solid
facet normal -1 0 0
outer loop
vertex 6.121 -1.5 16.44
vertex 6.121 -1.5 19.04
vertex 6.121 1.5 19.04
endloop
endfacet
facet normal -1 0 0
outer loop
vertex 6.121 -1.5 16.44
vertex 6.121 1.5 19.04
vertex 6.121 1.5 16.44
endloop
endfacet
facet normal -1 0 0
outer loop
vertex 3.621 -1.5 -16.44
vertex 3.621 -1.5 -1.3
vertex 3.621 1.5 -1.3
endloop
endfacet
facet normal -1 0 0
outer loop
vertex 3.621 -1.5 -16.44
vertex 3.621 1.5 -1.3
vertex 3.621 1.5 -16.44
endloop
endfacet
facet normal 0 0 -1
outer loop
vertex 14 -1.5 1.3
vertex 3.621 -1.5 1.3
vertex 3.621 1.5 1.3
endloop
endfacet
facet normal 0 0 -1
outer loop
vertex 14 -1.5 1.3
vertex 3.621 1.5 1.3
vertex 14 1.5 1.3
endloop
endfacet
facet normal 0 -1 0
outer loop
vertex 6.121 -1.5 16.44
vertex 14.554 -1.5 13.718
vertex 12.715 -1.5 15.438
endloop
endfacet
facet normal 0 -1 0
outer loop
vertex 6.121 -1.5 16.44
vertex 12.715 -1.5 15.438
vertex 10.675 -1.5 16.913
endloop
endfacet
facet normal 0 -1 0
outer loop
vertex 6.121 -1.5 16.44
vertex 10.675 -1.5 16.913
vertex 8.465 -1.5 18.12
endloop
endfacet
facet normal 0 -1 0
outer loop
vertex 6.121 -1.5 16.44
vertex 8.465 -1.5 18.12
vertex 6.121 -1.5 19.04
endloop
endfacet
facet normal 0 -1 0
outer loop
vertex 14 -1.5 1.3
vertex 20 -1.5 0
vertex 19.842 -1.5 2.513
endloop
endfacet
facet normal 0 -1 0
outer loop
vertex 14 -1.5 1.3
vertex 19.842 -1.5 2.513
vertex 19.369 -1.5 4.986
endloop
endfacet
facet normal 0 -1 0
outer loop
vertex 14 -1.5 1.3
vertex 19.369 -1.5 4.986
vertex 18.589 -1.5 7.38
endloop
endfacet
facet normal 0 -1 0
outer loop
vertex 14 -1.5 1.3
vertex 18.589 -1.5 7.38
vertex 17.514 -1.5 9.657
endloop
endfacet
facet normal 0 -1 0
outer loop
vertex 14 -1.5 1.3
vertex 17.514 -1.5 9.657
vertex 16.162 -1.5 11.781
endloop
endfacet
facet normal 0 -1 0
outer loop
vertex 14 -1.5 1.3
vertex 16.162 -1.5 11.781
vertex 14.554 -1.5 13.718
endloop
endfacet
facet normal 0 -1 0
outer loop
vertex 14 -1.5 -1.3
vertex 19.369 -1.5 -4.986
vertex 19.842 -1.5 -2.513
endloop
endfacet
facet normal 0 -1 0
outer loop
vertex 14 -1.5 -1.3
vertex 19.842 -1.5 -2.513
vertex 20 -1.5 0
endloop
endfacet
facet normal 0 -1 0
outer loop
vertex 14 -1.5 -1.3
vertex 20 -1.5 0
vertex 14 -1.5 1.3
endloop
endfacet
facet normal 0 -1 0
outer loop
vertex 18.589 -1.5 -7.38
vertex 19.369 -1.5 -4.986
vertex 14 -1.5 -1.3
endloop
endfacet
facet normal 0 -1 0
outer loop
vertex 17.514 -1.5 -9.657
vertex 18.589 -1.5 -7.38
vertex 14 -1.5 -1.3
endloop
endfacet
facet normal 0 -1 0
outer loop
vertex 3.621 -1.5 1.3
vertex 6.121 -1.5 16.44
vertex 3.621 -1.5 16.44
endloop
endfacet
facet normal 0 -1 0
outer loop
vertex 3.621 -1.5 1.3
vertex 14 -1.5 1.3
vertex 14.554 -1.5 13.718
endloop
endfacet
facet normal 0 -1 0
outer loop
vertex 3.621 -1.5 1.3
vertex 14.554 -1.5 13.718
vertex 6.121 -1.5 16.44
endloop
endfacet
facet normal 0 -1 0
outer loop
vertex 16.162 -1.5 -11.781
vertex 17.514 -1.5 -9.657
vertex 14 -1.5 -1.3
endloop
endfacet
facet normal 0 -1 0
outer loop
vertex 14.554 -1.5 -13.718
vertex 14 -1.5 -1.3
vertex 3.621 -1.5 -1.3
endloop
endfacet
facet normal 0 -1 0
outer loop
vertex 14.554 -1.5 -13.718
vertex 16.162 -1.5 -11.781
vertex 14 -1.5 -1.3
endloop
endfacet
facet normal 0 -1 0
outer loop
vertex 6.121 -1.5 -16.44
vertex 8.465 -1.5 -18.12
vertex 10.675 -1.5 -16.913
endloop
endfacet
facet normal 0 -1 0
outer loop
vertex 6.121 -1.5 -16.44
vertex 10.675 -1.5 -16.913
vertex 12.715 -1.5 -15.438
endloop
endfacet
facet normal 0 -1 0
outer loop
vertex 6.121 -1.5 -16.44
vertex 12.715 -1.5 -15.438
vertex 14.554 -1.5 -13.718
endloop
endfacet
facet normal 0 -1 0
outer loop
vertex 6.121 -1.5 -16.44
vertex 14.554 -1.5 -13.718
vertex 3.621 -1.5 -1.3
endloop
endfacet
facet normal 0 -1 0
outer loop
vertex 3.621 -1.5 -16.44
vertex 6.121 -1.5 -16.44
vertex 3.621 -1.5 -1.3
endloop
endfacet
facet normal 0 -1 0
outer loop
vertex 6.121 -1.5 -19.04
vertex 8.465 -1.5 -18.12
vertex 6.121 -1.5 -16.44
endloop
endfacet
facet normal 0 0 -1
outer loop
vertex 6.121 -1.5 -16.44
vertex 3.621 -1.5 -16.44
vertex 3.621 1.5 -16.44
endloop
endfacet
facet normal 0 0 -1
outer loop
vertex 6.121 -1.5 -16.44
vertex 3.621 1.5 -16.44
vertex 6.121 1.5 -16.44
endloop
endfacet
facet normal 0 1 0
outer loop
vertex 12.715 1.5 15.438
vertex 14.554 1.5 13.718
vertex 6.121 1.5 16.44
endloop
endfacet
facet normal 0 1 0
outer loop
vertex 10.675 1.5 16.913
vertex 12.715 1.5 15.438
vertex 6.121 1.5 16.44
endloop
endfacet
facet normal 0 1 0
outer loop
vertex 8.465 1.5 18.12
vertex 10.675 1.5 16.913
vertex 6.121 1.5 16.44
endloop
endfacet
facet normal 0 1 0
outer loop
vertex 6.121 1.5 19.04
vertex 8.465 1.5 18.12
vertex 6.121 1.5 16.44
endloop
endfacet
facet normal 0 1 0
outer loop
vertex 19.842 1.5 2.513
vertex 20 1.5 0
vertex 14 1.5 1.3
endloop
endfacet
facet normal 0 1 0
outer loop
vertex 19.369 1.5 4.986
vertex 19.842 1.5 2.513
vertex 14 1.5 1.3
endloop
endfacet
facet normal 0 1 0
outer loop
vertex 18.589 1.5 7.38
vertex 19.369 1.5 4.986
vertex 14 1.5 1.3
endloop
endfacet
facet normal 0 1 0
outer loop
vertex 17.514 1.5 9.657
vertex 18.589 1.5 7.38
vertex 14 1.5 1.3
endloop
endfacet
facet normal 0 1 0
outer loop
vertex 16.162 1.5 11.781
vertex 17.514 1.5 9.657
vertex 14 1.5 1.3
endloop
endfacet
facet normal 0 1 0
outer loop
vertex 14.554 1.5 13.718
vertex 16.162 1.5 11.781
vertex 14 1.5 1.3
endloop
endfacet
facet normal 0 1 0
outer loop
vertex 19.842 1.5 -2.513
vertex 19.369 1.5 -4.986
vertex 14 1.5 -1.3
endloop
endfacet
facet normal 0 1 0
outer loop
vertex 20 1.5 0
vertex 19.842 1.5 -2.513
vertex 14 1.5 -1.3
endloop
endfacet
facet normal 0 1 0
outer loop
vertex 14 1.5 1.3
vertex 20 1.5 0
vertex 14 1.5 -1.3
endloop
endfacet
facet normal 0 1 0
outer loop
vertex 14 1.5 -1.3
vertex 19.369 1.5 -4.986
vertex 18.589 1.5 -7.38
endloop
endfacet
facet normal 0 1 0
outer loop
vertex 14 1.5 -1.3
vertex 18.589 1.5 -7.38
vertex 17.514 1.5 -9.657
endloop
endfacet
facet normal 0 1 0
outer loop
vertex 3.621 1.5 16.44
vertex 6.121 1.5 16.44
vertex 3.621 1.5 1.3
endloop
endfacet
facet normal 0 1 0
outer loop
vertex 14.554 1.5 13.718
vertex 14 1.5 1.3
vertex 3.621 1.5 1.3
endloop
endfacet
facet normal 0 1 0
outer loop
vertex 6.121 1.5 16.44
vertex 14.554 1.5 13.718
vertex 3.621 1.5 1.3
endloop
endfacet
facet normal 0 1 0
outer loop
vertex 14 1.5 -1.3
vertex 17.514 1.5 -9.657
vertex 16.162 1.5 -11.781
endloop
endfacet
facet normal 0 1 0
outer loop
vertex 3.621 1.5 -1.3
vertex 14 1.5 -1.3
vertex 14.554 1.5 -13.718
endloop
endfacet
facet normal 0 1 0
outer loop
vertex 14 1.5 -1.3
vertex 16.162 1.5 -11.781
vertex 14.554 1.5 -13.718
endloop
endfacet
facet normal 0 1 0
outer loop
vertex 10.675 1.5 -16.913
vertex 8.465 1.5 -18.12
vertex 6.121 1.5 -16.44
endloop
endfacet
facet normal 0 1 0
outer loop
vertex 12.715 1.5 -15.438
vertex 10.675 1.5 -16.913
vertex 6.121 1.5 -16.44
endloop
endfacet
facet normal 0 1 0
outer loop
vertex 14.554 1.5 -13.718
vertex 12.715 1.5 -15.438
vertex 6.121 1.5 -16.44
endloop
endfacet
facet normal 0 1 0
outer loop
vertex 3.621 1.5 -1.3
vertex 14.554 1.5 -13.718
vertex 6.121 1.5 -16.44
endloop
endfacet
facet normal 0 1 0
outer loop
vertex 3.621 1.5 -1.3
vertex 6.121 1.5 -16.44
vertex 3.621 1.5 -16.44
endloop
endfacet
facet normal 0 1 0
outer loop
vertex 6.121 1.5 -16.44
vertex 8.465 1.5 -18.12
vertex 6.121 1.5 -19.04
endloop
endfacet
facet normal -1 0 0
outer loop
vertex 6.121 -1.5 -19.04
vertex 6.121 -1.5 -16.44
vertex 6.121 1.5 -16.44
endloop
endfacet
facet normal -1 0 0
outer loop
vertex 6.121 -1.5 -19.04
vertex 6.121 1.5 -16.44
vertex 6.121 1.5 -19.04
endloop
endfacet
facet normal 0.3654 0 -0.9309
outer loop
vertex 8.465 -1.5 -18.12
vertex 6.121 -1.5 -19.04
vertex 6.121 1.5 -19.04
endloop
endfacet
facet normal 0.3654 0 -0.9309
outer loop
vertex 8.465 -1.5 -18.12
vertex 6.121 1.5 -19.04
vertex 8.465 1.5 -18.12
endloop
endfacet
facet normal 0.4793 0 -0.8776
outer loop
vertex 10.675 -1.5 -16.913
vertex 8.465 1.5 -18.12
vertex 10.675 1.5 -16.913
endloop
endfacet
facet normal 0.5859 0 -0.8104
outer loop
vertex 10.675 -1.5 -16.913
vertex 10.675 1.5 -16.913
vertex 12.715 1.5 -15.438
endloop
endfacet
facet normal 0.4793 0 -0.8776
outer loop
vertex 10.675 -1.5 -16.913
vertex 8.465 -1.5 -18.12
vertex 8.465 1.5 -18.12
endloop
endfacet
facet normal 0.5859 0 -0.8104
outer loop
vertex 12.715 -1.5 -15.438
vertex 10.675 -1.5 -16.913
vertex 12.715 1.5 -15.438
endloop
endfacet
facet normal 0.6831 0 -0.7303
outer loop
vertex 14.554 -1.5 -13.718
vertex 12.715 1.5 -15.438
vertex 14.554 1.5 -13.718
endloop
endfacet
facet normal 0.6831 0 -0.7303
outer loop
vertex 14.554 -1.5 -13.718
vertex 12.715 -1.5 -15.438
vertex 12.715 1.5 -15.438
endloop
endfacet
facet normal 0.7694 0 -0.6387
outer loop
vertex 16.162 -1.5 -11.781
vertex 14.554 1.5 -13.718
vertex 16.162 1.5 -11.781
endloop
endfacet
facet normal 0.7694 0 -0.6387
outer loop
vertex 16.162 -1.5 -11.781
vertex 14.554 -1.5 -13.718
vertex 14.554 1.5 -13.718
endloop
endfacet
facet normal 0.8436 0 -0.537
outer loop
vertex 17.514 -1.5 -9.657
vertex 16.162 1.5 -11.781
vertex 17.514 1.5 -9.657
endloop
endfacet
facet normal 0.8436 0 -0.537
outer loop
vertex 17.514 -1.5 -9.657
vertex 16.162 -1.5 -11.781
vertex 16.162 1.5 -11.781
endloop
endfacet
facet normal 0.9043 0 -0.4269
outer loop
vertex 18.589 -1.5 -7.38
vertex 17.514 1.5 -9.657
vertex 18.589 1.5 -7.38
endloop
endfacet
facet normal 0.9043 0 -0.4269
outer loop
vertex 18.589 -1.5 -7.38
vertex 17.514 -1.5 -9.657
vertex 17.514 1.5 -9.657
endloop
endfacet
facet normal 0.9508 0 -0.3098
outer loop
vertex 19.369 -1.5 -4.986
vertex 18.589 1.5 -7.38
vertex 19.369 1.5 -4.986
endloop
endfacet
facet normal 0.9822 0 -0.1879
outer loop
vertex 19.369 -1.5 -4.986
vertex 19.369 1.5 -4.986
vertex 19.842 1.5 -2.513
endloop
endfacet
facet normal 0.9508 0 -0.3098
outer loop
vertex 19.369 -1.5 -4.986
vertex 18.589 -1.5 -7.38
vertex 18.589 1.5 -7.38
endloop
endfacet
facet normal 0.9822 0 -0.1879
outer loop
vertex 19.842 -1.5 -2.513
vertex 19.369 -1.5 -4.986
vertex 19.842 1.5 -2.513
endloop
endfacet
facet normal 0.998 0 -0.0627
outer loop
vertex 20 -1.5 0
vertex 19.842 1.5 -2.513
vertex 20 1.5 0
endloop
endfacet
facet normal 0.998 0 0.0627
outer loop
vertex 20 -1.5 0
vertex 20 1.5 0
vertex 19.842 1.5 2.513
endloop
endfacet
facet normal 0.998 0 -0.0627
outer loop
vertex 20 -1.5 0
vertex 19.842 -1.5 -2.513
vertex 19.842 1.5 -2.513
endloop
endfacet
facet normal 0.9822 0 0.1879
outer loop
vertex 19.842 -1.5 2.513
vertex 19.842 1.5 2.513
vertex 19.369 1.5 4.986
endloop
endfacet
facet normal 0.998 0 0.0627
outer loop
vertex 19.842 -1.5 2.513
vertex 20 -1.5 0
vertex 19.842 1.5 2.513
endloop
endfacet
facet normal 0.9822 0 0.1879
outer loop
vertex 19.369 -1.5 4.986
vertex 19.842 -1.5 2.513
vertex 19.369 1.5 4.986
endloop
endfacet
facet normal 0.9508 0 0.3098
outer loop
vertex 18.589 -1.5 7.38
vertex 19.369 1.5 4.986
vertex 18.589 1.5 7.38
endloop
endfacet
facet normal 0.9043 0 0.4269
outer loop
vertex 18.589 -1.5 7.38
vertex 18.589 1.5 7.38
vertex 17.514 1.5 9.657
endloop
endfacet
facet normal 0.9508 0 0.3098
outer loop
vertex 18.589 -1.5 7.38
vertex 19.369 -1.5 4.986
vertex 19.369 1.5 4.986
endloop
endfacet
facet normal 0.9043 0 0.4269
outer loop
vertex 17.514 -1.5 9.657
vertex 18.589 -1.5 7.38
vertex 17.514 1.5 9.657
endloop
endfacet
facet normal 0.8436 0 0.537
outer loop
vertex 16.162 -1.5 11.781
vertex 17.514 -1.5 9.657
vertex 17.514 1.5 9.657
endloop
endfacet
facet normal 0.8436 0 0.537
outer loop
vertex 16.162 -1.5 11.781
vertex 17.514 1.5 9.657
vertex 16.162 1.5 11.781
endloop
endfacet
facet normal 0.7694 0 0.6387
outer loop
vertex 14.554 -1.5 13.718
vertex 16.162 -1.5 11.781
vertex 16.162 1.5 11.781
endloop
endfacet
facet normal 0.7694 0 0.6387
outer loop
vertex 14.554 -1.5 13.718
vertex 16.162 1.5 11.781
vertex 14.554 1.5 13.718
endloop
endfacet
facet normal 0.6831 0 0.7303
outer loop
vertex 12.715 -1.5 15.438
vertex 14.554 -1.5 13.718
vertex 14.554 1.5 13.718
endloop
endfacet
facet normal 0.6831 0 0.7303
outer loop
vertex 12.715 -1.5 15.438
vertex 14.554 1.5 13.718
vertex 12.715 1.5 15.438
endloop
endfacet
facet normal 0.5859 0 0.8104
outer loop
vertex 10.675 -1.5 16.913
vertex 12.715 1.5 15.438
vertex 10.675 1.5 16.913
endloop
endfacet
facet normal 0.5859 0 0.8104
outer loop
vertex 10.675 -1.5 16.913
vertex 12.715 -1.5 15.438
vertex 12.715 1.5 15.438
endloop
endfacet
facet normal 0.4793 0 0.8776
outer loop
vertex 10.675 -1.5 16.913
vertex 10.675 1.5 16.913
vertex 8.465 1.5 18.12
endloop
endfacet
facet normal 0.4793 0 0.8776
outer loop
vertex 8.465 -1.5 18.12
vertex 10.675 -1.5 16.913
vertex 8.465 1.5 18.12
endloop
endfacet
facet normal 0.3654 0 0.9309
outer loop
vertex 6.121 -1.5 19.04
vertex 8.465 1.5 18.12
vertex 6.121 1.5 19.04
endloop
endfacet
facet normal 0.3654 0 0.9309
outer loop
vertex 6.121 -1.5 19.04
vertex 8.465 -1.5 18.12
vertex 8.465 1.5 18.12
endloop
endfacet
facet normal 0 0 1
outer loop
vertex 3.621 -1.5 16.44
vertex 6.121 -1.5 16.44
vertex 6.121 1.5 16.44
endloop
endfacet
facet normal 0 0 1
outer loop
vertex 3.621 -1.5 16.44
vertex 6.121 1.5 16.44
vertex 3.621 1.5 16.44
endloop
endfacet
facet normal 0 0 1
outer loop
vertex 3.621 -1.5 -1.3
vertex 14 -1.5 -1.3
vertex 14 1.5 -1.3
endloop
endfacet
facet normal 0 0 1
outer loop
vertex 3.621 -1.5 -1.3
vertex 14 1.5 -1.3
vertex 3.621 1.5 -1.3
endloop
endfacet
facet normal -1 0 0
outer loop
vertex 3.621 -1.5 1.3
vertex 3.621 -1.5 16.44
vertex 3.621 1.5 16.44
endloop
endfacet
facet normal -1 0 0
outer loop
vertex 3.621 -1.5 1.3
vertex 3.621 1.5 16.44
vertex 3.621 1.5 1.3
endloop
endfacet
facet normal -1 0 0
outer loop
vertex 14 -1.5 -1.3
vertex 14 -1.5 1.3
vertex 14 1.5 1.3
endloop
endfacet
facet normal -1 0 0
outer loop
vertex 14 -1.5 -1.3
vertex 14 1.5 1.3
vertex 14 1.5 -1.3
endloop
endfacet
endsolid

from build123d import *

# Parameters (mm, degrees)
BOSS_EXTRUDE1_DEPTH      = 1.5
BOSS_EXTRUDE1_DEPTH_BACK = 1.5


with BuildPart() as part:
    # Sketch1 → Boss-Extrude1 (new, two sides: drawn at the far end of the back side and taken through both)
    with BuildSketch(Plane(origin=(0, 0, 0), x_dir=(1, 0, 0), z_dir=(0, 1, 0)).offset(-BOSS_EXTRUDE1_DEPTH_BACK)):
        with BuildLine():
            Line((3.621320344, -1.3), (14, -1.3))
            Line((14, -1.3), (14, 1.3))
            Line((14, 1.3), (3.621320344, 1.3))
            Line((3.621320344, 1.3), (3.621320344, 16.440205809))
            Line((3.621320344, 16.440205809), (6.121320344, 16.440205809))
            Line((6.121320344, 16.440205809), (6.121320344, 19.040205809))
            ThreePointArc((6.121320344, 19.040205809), (20, 0), (6.121320344, -19.040205809))
            Line((6.121320344, -19.040205809), (6.121320344, -16.440205809))
            Line((6.121320344, -16.440205809), (3.621320344, -16.440205809))
            Line((3.621320344, -16.440205809), (3.621320344, -1.3))
        make_face()
    extrude(amount=BOSS_EXTRUDE1_DEPTH + BOSS_EXTRUDE1_DEPTH_BACK)


solid = part.part
